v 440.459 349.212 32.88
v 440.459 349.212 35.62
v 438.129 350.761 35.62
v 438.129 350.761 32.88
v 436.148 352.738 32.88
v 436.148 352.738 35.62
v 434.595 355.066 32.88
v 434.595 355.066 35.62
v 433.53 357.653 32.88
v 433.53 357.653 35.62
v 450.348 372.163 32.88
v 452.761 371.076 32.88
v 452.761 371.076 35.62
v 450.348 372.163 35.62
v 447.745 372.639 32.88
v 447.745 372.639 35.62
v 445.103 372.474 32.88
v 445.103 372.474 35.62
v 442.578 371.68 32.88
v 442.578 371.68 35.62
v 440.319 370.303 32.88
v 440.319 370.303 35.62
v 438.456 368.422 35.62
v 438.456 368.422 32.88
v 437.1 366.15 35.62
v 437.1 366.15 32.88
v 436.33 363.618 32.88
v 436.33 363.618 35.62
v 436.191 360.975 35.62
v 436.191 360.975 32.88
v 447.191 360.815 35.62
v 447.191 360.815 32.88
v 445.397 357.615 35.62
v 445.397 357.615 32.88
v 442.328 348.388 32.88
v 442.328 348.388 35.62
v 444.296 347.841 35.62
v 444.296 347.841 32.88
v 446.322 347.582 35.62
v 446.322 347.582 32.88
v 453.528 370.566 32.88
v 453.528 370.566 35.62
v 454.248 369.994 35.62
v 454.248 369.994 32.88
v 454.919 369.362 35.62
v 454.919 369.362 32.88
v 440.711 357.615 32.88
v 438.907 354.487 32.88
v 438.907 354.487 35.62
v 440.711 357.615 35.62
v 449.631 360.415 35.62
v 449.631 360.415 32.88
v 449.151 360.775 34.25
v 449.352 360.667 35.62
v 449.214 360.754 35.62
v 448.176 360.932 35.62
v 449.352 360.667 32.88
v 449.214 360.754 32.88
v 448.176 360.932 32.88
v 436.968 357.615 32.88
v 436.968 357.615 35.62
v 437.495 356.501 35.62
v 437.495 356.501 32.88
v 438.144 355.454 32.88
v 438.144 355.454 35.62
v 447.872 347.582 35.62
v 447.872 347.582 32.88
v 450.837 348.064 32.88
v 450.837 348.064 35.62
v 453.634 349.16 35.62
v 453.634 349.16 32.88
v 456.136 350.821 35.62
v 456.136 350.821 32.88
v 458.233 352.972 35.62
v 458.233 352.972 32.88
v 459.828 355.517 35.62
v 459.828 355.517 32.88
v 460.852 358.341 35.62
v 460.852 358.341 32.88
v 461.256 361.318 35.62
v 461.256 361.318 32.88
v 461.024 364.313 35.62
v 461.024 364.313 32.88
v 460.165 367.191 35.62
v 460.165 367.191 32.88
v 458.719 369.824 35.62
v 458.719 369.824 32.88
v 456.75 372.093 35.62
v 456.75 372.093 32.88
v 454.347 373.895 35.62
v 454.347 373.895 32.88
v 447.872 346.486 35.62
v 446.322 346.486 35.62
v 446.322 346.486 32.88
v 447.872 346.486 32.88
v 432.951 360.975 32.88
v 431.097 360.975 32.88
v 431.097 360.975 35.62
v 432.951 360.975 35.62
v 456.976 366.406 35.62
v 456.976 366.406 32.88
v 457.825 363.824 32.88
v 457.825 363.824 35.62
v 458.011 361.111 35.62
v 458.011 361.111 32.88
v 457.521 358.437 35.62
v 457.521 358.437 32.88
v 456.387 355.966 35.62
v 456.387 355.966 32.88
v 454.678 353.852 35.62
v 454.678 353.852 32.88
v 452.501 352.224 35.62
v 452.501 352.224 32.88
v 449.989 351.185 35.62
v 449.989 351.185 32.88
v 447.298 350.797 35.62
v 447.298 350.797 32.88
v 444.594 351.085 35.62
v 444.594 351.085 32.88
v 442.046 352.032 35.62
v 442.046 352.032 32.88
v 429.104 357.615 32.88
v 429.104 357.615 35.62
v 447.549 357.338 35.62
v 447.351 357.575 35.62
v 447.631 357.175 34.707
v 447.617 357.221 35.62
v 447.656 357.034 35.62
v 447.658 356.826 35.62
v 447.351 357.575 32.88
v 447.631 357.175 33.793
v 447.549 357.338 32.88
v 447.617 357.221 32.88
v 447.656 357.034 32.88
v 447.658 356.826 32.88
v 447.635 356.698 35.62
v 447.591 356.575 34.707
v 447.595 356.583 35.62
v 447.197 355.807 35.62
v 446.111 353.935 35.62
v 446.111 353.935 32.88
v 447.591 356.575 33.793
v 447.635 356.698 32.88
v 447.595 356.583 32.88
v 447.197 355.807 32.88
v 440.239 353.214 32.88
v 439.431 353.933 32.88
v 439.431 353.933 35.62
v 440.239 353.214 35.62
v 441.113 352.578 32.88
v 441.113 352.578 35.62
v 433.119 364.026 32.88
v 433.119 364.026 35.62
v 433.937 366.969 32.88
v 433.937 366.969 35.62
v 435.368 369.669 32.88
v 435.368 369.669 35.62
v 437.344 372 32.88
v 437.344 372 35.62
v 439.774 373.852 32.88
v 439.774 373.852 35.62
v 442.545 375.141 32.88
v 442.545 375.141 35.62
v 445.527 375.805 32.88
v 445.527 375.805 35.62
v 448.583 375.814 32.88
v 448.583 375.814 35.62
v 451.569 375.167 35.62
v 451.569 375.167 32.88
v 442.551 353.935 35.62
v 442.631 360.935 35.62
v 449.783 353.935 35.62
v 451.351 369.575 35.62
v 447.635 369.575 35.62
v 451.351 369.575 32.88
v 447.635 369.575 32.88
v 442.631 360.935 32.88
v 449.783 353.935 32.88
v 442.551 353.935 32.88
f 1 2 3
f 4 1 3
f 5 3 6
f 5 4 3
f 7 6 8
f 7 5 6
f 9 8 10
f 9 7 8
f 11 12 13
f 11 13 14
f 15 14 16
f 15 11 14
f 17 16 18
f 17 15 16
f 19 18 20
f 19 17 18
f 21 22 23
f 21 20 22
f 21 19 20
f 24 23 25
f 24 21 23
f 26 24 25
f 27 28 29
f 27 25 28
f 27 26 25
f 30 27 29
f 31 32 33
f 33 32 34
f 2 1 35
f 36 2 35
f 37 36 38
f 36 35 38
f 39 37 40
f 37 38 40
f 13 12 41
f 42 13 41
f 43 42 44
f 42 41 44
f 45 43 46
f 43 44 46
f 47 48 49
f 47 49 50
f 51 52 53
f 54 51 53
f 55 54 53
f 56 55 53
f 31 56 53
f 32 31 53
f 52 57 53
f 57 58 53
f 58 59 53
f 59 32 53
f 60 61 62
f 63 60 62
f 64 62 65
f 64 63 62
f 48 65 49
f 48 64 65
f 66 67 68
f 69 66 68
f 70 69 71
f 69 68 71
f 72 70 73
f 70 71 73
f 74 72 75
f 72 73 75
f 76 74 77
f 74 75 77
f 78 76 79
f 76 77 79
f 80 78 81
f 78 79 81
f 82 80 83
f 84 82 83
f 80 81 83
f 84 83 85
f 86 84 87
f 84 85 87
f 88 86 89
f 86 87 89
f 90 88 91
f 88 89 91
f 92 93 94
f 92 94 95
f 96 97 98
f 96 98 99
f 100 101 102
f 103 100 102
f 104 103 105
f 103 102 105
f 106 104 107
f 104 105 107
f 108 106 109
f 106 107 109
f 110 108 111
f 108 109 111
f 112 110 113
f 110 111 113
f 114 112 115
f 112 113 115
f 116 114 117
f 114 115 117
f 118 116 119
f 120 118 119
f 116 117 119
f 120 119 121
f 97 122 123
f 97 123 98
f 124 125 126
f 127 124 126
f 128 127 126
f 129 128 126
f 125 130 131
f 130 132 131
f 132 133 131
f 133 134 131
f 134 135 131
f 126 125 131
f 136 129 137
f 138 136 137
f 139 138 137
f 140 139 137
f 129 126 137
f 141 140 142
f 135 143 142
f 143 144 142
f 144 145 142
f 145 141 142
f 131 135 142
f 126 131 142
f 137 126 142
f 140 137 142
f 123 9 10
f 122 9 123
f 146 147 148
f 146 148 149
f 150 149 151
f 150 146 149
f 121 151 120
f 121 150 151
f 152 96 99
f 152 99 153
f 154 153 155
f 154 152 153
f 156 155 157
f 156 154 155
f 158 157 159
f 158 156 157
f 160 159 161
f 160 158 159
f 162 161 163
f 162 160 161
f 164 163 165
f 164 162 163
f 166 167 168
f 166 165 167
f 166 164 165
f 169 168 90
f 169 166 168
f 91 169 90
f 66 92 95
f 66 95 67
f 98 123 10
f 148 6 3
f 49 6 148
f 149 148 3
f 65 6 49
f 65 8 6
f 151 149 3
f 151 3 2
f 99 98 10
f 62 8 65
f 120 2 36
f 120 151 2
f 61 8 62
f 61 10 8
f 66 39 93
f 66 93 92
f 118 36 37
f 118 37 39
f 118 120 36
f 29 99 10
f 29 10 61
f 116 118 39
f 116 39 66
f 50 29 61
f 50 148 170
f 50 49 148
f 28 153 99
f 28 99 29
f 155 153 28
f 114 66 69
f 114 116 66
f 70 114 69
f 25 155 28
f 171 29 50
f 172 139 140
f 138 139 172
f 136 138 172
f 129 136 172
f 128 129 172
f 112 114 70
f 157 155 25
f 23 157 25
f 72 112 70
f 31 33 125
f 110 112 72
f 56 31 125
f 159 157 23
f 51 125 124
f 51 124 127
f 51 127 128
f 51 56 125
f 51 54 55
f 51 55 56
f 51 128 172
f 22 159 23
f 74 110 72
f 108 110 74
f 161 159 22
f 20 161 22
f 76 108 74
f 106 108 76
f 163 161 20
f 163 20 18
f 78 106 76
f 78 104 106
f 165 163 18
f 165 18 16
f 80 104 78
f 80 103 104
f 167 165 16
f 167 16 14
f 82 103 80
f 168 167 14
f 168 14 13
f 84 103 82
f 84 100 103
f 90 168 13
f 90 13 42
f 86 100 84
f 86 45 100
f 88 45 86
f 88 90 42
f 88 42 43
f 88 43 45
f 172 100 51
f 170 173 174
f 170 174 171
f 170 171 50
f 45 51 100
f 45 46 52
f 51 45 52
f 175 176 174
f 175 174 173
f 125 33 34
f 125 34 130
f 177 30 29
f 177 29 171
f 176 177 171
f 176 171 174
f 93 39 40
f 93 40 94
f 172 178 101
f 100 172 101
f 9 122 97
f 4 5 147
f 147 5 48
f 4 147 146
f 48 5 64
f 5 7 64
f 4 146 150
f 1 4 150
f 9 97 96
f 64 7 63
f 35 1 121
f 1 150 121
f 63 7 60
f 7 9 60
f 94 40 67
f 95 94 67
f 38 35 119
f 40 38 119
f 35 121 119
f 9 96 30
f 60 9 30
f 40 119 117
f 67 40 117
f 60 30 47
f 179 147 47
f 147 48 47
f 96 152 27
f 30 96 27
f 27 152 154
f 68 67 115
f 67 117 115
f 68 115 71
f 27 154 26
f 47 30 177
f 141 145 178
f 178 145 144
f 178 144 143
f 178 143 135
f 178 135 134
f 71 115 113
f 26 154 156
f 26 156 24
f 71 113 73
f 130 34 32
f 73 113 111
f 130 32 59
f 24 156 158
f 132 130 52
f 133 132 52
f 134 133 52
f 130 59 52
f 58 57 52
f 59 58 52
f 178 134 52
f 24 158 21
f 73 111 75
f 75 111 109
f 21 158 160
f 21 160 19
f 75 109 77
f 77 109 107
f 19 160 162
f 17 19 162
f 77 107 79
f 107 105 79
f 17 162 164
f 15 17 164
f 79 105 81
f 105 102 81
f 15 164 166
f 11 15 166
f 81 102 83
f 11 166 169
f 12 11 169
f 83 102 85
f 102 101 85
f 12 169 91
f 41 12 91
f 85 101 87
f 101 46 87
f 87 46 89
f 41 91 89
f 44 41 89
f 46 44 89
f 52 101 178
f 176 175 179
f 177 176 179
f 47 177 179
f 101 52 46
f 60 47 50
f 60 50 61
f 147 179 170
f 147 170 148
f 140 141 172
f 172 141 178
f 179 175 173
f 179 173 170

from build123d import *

# Parameters (mm, degrees)
BOSS_EXTRUDE1_DEPTH = 68.5
SCALE1_DEPTH        = 68.5
SCALE1_2_DEPTH      = 32.880047435
SCALE1_START        = 35.620047435
SCALE1_3_DEPTH      = 32.879952565
SCALE1_START_2      = 32.880047435
SCALE1_4_DEPTH      = 2.74


# Read off the part's stored shape, not the designer's step: Scale1
with BuildPart() as part:
    # Sketch1 → Boss-Extrude1 (new body)
    with BuildSketch(Plane.XY):
        with BuildLine():
            Line((6.806314099, 268.000000001), (117.455935844, 268.970996088))
            ThreePointArc((117.455935844, 268.970996088), (237.572521573, 92.54839531), (437.259031844, 17.194391779))
            Line((437.259031844, 17.194391779), (437.259031844, -10.223169449))
            Line((437.259031844, -10.223169449), (476.009031844, -10.223169449))
            Line((476.009031844, -10.223169449), (476.009031844, 17.194391779))
            ThreePointArc((476.009031844, 17.194391779), (693.184182798, 634.339249245), (103, 352))
            Line((103, 352), (56.640547879, 352))
            Line((56.640547879, 352), (6.806314099, 268.000000001))
        make_face()
        with BuildLine():
            ThreePointArc((251.884299831, 189.799453042), (224.339726467, 226.845833922), (203.423883848, 268.000000001))
            Line((203.423883848, 268.000000001), (297, 268.000000001))
            Line((297, 268.000000001), (251.884299831, 189.799453042))
        make_face(mode=Mode.SUBTRACT)
        with BuildLine():
            ThreePointArc((183.999999995, 352.000000012), (344.926101955, 620.204516968), (652.184505988, 561.696856288))
            Line((652.184505988, 561.696856288), (520, 338))
            add(Edge.make_bspline(
                [(520, 338), (516, 341), (512.856486558, 345.810656353), (508, 347), (483.294181497, 353.050404531), (477.851743634, 351.141957272), (459, 348)],
                knots=[0, 0, 0, 0, 1, 1, 1, 2, 2, 2, 2], degree=3))
            Line((459, 348), (414.15311107, 268.000000001))
            Line((414.15311107, 268.000000001), (463, 267))
            add(Edge.make_bspline(
                [(463, 267), (465.333333333, 263.666666667), (469.050440025, 260.956499894), (470, 257), (471.16945492, 252.127271165), (471.128314939, 246.536671316), (469, 242), (458.288028235, 219.166586501), (444.333333333, 198), (432, 176)],
                knots=[0, 0, 0, 0, 1, 1, 1, 2, 2, 2, 3, 3, 3, 3], degree=3))
            Line((432, 176), (523.783724069, 176))
            Line((523.783724069, 176), (703.607534398, 487.787583679))
            ThreePointArc((703.607534398, 487.787583679), (614.979125151, 148.065376335), (264.996930573, 175.96943637))
            Line((264.996930573, 175.96943637), (342.999405137, 176))
            Line((342.999405137, 176), (562.999999995, 567.000000012))
            Line((562.999999995, 567.000000012), (470.080751257, 567.000000012))
            Line((470.080751257, 567.000000012), (344.999999995, 351.000000012))
            Line((344.999999995, 351.000000012), (183.999999995, 352.000000012))
        make_face(mode=Mode.SUBTRACT)
    extrude(amount=BOSS_EXTRUDE1_DEPTH)

    # Scale1 outline → Scale1 (cut)
    # profile 1 of 3: a face of its own
    with BuildSketch(Plane.XY):
        with BuildLine():
            Line((56.640547879, 352), (6.806314099, 268.000000001))
            Line((6.806314099, 268.000000001), (117.455935844, 268.970996088))
            ThreePointArc((117.455935844, 268.970996088), (237.572521573, 92.54839531), (437.259031844, 17.194391779))
            Line((437.259031844, 17.194391779), (437.259031844, -10.223169449))
            Line((437.259031844, -10.223169449), (476.009031844, -10.223169449))
            Line((476.009031844, -10.223169449), (476.009031844, 17.194391779))
            ThreePointArc((476.009031844, 17.194391779), (693.184182798, 634.339249245), (103, 352))
            Line((103, 352), (56.640547879, 352))
        make_face()
        with BuildLine():
            Line((297, 268.000000001), (251.884299831, 189.799453042))
            ThreePointArc((251.884299831, 189.799453042), (224.339726467, 226.845833922), (203.423883848, 268.000000001))
            Line((203.423883848, 268.000000001), (297, 268.000000001))
        make_face(mode=Mode.SUBTRACT)
        with BuildLine():
            Line((342.999405137, 176), (440.459332473, 349.212402512))
            ThreePointArc((440.459332473, 349.212402512), (436.148252718, 352.738231864), (433.529545779, 357.653438395))
            Line((433.529545779, 357.653438395), (429.103560909, 357.614598551))
            Line((429.103560909, 357.614598551), (431.09693026, 360.974598551))
            Line((431.09693026, 360.974598551), (432.951308345, 360.974598551))
            ThreePointArc((432.951308345, 360.974598551), (439.774077465, 373.852337705), (454.347494733, 373.89538779))
            Line((454.347494733, 373.89538779), (562.999999995, 567.000000012))
            Line((562.999999995, 567.000000012), (470.080751257, 567.000000012))
            Line((470.080751257, 567.000000012), (344.999999995, 351.000000012))
            Line((344.999999995, 351.000000012), (183.999999995, 352.000000012))
            ThreePointArc((183.999999995, 352.000000012), (344.926101955, 620.204516968), (652.184505988, 561.696856288))
            Line((652.184505988, 561.696856288), (520, 338))
            add(Edge.make_bspline(
                [(520, 338), (516, 341), (512.856486558, 345.810656353), (508, 347), (483.294181497, 353.050404531), (477.851743634, 351.141957272), (459, 348)],
                knots=[0, 0, 0, 0, 1, 1, 1, 2, 2, 2, 2], degree=3))
            Line((459, 348), (414.15311107, 268.000000001))
            Line((414.15311107, 268.000000001), (463, 267))
            add(Edge.make_bspline(
                [(463, 267), (465.333333333, 263.666666667), (469.050440025, 260.956499894), (470, 257), (471.16945492, 252.127271165), (471.128314939, 246.536671316), (469, 242), (458.288028235, 219.166586501), (444.333333333, 198), (432, 176)],
                knots=[0, 0, 0, 0, 1, 1, 1, 2, 2, 2, 3, 3, 3, 3], degree=3))
            Line((432, 176), (523.783724069, 176))
            Line((523.783724069, 176), (703.607534398, 487.787583679))
            ThreePointArc((703.607534398, 487.787583679), (614.979125151, 148.065376335), (264.996930573, 175.96943637))
            Line((264.996930573, 175.96943637), (342.999405137, 176))
        make_face(mode=Mode.SUBTRACT)
    # profile 2 of 3: a face of its own
    with BuildSketch(Plane.XY):
        with BuildLine():
            ThreePointArc((436.968263699, 357.614598551), (437.804897404, 355.968431908), (438.906680338, 354.486576673))
            Line((438.906680338, 354.486576673), (440.711308345, 357.614598551))
            Line((440.711308345, 357.614598551), (436.968263699, 357.614598551))
        make_face()
    # profile 3 of 3: a face of its own
    with BuildSketch(Plane.XY):
        with BuildLine():
            ThreePointArc((439.431185568, 353.933376006), (440.667845198, 352.885534626), (442.04585661, 352.032080968))
            Line((442.04585661, 352.032080968), (452.760970596, 371.075709333))
            ThreePointArc((452.760970596, 371.075709333), (441.406740972, 371.060134505), (436.191308345, 360.974598552))
            Line((436.191308345, 360.974598552), (442.631308345, 360.934598552))
            Line((442.631308345, 360.934598552), (447.634538395, 369.574598552))
            Line((447.634538395, 369.574598552), (451.351308345, 369.574598552))
            Line((451.351308345, 369.574598552), (442.551284551, 353.934598551))
            Line((442.551284551, 353.934598551), (439.431185568, 353.933376006))
        make_face()
    extrude(amount=SCALE1_DEPTH, mode=Mode.SUBTRACT)

    # Scale1 2 outline → Scale1 2 (cut)
    with BuildSketch(Plane.XY):
        with BuildLine():
            Line((440.459332473, 349.212402512), (442.04585661, 352.032080968))
            ThreePointArc((442.04585661, 352.032080968), (440.667845198, 352.885534626), (439.431185568, 353.933376006))
            Line((439.431185568, 353.933376006), (442.551284551, 353.934598551))
            Line((442.551284551, 353.934598551), (451.351308345, 369.574598552))
            Line((451.351308345, 369.574598552), (447.634538395, 369.574598552))
            Line((447.634538395, 369.574598552), (442.631308345, 360.934598552))
            Line((442.631308345, 360.934598552), (436.191308345, 360.974598552))
            ThreePointArc((436.191308345, 360.974598552), (441.406740972, 371.060134505), (452.760970596, 371.075709333))
            Line((452.760970596, 371.075709333), (454.347494733, 373.89538779))
            ThreePointArc((454.347494733, 373.89538779), (439.774077465, 373.852337705), (432.951308345, 360.974598551))
            Line((432.951308345, 360.974598551), (431.09693026, 360.974598551))
            Line((431.09693026, 360.974598551), (429.103560909, 357.614598551))
            Line((429.103560909, 357.614598551), (433.529545779, 357.653438395))
            ThreePointArc((433.529545779, 357.653438395), (436.148252718, 352.738231864), (440.459332473, 349.212402512))
        make_face()
        with BuildLine():
            Line((440.711308345, 357.614598551), (438.906680338, 354.486576673))
            ThreePointArc((438.906680338, 354.486576673), (437.804897404, 355.968431908), (436.968263699, 357.614598551))
            Line((436.968263699, 357.614598551), (440.711308345, 357.614598551))
        make_face(mode=Mode.SUBTRACT)
    extrude(amount=SCALE1_2_DEPTH, mode=Mode.SUBTRACT)

    # Scale1 3 outline → Scale1 3 (cut)
    with BuildSketch(Plane.XY.offset(SCALE1_START)):
        with BuildLine():
            Line((440.459332473, 349.212402512), (442.04585661, 352.032080968))
            ThreePointArc((442.04585661, 352.032080968), (440.667845198, 352.885534626), (439.431185568, 353.933376006))
            Line((439.431185568, 353.933376006), (442.551284551, 353.934598551))
            Line((442.551284551, 353.934598551), (451.351308345, 369.574598552))
            Line((451.351308345, 369.574598552), (447.634538395, 369.574598552))
            Line((447.634538395, 369.574598552), (442.631308345, 360.934598552))
            Line((442.631308345, 360.934598552), (436.191308345, 360.974598552))
            ThreePointArc((436.191308345, 360.974598552), (441.406740972, 371.060134505), (452.760970596, 371.075709333))
            Line((452.760970596, 371.075709333), (454.347494733, 373.89538779))
            ThreePointArc((454.347494733, 373.89538779), (439.774077465, 373.852337705), (432.951308345, 360.974598551))
            Line((432.951308345, 360.974598551), (431.09693026, 360.974598551))
            Line((431.09693026, 360.974598551), (429.103560909, 357.614598551))
            Line((429.103560909, 357.614598551), (433.529545779, 357.653438395))
            ThreePointArc((433.529545779, 357.653438395), (436.148252718, 352.738231864), (440.459332473, 349.212402512))
        make_face()
        with BuildLine():
            Line((440.711308345, 357.614598551), (438.906680338, 354.486576673))
            ThreePointArc((438.906680338, 354.486576673), (437.804897404, 355.968431908), (436.968263699, 357.614598551))
            Line((436.968263699, 357.614598551), (440.711308345, 357.614598551))
        make_face(mode=Mode.SUBTRACT)
    extrude(amount=SCALE1_3_DEPTH, mode=Mode.SUBTRACT)

    # Scale1 4 outline → Scale1 4 (add)
    with BuildSketch(Plane.XY.offset(SCALE1_START_2)):
        with BuildLine():
            Line((445.397432788, 357.614598551), (447.351308345, 357.574598551))
            add(Edge.make_bspline(
                [(447.351308345, 357.574598551), (447.444641678, 357.441265218), (447.593325946, 357.332858547), (447.631308345, 357.174598551), (447.678086542, 356.979689398), (447.676440943, 356.756065404), (447.591308345, 356.574598551), (447.162829475, 355.661262011), (446.604641678, 354.814598551), (446.111308345, 353.934598551)],
                knots=[0, 0, 0, 0, 1, 1, 1, 2, 2, 2, 3, 3, 3, 3], degree=3))
            Line((446.111308345, 353.934598551), (449.782657308, 353.934598551))
            Line((449.782657308, 353.934598551), (456.975609721, 366.406101898))
            ThreePointArc((456.975609721, 366.406101898), (454.678280413, 353.851755114), (442.04585661, 352.032080968))
            Line((442.04585661, 352.032080968), (440.459332473, 349.212402512))
            ThreePointArc((440.459332473, 349.212402512), (443.301945183, 348.078900443), (446.321669619, 347.582374223))
            Line((446.321669619, 347.582374223), (446.321669619, 346.485671773))
            Line((446.321669619, 346.485671773), (447.871669619, 346.485671773))
            Line((447.871669619, 346.485671773), (447.871669619, 347.582374223))
            ThreePointArc((447.871669619, 347.582374223), (460.851564672, 358.341307853), (454.347494733, 373.89538779))
            Line((454.347494733, 373.89538779), (452.760970596, 371.075709333))
            ThreePointArc((452.760970596, 371.075709333), (453.894022137, 370.287343309), (454.918688585, 369.362472803))
            Line((454.918688585, 369.362472803), (449.631308345, 360.414598551))
            add(Edge.make_bspline(
                [(449.631308345, 360.414598551), (449.471308345, 360.534598551), (449.345567807, 360.727024805), (449.151308345, 360.774598551), (448.163075605, 361.016614733), (447.945378091, 360.940276842), (447.191308345, 360.814598551)],
                knots=[0, 0, 0, 0, 1, 1, 1, 2, 2, 2, 2], degree=3))
            Line((447.191308345, 360.814598551), (445.397432788, 357.614598551))
        make_face()
    extrude(amount=SCALE1_4_DEPTH)


solid = part.part
